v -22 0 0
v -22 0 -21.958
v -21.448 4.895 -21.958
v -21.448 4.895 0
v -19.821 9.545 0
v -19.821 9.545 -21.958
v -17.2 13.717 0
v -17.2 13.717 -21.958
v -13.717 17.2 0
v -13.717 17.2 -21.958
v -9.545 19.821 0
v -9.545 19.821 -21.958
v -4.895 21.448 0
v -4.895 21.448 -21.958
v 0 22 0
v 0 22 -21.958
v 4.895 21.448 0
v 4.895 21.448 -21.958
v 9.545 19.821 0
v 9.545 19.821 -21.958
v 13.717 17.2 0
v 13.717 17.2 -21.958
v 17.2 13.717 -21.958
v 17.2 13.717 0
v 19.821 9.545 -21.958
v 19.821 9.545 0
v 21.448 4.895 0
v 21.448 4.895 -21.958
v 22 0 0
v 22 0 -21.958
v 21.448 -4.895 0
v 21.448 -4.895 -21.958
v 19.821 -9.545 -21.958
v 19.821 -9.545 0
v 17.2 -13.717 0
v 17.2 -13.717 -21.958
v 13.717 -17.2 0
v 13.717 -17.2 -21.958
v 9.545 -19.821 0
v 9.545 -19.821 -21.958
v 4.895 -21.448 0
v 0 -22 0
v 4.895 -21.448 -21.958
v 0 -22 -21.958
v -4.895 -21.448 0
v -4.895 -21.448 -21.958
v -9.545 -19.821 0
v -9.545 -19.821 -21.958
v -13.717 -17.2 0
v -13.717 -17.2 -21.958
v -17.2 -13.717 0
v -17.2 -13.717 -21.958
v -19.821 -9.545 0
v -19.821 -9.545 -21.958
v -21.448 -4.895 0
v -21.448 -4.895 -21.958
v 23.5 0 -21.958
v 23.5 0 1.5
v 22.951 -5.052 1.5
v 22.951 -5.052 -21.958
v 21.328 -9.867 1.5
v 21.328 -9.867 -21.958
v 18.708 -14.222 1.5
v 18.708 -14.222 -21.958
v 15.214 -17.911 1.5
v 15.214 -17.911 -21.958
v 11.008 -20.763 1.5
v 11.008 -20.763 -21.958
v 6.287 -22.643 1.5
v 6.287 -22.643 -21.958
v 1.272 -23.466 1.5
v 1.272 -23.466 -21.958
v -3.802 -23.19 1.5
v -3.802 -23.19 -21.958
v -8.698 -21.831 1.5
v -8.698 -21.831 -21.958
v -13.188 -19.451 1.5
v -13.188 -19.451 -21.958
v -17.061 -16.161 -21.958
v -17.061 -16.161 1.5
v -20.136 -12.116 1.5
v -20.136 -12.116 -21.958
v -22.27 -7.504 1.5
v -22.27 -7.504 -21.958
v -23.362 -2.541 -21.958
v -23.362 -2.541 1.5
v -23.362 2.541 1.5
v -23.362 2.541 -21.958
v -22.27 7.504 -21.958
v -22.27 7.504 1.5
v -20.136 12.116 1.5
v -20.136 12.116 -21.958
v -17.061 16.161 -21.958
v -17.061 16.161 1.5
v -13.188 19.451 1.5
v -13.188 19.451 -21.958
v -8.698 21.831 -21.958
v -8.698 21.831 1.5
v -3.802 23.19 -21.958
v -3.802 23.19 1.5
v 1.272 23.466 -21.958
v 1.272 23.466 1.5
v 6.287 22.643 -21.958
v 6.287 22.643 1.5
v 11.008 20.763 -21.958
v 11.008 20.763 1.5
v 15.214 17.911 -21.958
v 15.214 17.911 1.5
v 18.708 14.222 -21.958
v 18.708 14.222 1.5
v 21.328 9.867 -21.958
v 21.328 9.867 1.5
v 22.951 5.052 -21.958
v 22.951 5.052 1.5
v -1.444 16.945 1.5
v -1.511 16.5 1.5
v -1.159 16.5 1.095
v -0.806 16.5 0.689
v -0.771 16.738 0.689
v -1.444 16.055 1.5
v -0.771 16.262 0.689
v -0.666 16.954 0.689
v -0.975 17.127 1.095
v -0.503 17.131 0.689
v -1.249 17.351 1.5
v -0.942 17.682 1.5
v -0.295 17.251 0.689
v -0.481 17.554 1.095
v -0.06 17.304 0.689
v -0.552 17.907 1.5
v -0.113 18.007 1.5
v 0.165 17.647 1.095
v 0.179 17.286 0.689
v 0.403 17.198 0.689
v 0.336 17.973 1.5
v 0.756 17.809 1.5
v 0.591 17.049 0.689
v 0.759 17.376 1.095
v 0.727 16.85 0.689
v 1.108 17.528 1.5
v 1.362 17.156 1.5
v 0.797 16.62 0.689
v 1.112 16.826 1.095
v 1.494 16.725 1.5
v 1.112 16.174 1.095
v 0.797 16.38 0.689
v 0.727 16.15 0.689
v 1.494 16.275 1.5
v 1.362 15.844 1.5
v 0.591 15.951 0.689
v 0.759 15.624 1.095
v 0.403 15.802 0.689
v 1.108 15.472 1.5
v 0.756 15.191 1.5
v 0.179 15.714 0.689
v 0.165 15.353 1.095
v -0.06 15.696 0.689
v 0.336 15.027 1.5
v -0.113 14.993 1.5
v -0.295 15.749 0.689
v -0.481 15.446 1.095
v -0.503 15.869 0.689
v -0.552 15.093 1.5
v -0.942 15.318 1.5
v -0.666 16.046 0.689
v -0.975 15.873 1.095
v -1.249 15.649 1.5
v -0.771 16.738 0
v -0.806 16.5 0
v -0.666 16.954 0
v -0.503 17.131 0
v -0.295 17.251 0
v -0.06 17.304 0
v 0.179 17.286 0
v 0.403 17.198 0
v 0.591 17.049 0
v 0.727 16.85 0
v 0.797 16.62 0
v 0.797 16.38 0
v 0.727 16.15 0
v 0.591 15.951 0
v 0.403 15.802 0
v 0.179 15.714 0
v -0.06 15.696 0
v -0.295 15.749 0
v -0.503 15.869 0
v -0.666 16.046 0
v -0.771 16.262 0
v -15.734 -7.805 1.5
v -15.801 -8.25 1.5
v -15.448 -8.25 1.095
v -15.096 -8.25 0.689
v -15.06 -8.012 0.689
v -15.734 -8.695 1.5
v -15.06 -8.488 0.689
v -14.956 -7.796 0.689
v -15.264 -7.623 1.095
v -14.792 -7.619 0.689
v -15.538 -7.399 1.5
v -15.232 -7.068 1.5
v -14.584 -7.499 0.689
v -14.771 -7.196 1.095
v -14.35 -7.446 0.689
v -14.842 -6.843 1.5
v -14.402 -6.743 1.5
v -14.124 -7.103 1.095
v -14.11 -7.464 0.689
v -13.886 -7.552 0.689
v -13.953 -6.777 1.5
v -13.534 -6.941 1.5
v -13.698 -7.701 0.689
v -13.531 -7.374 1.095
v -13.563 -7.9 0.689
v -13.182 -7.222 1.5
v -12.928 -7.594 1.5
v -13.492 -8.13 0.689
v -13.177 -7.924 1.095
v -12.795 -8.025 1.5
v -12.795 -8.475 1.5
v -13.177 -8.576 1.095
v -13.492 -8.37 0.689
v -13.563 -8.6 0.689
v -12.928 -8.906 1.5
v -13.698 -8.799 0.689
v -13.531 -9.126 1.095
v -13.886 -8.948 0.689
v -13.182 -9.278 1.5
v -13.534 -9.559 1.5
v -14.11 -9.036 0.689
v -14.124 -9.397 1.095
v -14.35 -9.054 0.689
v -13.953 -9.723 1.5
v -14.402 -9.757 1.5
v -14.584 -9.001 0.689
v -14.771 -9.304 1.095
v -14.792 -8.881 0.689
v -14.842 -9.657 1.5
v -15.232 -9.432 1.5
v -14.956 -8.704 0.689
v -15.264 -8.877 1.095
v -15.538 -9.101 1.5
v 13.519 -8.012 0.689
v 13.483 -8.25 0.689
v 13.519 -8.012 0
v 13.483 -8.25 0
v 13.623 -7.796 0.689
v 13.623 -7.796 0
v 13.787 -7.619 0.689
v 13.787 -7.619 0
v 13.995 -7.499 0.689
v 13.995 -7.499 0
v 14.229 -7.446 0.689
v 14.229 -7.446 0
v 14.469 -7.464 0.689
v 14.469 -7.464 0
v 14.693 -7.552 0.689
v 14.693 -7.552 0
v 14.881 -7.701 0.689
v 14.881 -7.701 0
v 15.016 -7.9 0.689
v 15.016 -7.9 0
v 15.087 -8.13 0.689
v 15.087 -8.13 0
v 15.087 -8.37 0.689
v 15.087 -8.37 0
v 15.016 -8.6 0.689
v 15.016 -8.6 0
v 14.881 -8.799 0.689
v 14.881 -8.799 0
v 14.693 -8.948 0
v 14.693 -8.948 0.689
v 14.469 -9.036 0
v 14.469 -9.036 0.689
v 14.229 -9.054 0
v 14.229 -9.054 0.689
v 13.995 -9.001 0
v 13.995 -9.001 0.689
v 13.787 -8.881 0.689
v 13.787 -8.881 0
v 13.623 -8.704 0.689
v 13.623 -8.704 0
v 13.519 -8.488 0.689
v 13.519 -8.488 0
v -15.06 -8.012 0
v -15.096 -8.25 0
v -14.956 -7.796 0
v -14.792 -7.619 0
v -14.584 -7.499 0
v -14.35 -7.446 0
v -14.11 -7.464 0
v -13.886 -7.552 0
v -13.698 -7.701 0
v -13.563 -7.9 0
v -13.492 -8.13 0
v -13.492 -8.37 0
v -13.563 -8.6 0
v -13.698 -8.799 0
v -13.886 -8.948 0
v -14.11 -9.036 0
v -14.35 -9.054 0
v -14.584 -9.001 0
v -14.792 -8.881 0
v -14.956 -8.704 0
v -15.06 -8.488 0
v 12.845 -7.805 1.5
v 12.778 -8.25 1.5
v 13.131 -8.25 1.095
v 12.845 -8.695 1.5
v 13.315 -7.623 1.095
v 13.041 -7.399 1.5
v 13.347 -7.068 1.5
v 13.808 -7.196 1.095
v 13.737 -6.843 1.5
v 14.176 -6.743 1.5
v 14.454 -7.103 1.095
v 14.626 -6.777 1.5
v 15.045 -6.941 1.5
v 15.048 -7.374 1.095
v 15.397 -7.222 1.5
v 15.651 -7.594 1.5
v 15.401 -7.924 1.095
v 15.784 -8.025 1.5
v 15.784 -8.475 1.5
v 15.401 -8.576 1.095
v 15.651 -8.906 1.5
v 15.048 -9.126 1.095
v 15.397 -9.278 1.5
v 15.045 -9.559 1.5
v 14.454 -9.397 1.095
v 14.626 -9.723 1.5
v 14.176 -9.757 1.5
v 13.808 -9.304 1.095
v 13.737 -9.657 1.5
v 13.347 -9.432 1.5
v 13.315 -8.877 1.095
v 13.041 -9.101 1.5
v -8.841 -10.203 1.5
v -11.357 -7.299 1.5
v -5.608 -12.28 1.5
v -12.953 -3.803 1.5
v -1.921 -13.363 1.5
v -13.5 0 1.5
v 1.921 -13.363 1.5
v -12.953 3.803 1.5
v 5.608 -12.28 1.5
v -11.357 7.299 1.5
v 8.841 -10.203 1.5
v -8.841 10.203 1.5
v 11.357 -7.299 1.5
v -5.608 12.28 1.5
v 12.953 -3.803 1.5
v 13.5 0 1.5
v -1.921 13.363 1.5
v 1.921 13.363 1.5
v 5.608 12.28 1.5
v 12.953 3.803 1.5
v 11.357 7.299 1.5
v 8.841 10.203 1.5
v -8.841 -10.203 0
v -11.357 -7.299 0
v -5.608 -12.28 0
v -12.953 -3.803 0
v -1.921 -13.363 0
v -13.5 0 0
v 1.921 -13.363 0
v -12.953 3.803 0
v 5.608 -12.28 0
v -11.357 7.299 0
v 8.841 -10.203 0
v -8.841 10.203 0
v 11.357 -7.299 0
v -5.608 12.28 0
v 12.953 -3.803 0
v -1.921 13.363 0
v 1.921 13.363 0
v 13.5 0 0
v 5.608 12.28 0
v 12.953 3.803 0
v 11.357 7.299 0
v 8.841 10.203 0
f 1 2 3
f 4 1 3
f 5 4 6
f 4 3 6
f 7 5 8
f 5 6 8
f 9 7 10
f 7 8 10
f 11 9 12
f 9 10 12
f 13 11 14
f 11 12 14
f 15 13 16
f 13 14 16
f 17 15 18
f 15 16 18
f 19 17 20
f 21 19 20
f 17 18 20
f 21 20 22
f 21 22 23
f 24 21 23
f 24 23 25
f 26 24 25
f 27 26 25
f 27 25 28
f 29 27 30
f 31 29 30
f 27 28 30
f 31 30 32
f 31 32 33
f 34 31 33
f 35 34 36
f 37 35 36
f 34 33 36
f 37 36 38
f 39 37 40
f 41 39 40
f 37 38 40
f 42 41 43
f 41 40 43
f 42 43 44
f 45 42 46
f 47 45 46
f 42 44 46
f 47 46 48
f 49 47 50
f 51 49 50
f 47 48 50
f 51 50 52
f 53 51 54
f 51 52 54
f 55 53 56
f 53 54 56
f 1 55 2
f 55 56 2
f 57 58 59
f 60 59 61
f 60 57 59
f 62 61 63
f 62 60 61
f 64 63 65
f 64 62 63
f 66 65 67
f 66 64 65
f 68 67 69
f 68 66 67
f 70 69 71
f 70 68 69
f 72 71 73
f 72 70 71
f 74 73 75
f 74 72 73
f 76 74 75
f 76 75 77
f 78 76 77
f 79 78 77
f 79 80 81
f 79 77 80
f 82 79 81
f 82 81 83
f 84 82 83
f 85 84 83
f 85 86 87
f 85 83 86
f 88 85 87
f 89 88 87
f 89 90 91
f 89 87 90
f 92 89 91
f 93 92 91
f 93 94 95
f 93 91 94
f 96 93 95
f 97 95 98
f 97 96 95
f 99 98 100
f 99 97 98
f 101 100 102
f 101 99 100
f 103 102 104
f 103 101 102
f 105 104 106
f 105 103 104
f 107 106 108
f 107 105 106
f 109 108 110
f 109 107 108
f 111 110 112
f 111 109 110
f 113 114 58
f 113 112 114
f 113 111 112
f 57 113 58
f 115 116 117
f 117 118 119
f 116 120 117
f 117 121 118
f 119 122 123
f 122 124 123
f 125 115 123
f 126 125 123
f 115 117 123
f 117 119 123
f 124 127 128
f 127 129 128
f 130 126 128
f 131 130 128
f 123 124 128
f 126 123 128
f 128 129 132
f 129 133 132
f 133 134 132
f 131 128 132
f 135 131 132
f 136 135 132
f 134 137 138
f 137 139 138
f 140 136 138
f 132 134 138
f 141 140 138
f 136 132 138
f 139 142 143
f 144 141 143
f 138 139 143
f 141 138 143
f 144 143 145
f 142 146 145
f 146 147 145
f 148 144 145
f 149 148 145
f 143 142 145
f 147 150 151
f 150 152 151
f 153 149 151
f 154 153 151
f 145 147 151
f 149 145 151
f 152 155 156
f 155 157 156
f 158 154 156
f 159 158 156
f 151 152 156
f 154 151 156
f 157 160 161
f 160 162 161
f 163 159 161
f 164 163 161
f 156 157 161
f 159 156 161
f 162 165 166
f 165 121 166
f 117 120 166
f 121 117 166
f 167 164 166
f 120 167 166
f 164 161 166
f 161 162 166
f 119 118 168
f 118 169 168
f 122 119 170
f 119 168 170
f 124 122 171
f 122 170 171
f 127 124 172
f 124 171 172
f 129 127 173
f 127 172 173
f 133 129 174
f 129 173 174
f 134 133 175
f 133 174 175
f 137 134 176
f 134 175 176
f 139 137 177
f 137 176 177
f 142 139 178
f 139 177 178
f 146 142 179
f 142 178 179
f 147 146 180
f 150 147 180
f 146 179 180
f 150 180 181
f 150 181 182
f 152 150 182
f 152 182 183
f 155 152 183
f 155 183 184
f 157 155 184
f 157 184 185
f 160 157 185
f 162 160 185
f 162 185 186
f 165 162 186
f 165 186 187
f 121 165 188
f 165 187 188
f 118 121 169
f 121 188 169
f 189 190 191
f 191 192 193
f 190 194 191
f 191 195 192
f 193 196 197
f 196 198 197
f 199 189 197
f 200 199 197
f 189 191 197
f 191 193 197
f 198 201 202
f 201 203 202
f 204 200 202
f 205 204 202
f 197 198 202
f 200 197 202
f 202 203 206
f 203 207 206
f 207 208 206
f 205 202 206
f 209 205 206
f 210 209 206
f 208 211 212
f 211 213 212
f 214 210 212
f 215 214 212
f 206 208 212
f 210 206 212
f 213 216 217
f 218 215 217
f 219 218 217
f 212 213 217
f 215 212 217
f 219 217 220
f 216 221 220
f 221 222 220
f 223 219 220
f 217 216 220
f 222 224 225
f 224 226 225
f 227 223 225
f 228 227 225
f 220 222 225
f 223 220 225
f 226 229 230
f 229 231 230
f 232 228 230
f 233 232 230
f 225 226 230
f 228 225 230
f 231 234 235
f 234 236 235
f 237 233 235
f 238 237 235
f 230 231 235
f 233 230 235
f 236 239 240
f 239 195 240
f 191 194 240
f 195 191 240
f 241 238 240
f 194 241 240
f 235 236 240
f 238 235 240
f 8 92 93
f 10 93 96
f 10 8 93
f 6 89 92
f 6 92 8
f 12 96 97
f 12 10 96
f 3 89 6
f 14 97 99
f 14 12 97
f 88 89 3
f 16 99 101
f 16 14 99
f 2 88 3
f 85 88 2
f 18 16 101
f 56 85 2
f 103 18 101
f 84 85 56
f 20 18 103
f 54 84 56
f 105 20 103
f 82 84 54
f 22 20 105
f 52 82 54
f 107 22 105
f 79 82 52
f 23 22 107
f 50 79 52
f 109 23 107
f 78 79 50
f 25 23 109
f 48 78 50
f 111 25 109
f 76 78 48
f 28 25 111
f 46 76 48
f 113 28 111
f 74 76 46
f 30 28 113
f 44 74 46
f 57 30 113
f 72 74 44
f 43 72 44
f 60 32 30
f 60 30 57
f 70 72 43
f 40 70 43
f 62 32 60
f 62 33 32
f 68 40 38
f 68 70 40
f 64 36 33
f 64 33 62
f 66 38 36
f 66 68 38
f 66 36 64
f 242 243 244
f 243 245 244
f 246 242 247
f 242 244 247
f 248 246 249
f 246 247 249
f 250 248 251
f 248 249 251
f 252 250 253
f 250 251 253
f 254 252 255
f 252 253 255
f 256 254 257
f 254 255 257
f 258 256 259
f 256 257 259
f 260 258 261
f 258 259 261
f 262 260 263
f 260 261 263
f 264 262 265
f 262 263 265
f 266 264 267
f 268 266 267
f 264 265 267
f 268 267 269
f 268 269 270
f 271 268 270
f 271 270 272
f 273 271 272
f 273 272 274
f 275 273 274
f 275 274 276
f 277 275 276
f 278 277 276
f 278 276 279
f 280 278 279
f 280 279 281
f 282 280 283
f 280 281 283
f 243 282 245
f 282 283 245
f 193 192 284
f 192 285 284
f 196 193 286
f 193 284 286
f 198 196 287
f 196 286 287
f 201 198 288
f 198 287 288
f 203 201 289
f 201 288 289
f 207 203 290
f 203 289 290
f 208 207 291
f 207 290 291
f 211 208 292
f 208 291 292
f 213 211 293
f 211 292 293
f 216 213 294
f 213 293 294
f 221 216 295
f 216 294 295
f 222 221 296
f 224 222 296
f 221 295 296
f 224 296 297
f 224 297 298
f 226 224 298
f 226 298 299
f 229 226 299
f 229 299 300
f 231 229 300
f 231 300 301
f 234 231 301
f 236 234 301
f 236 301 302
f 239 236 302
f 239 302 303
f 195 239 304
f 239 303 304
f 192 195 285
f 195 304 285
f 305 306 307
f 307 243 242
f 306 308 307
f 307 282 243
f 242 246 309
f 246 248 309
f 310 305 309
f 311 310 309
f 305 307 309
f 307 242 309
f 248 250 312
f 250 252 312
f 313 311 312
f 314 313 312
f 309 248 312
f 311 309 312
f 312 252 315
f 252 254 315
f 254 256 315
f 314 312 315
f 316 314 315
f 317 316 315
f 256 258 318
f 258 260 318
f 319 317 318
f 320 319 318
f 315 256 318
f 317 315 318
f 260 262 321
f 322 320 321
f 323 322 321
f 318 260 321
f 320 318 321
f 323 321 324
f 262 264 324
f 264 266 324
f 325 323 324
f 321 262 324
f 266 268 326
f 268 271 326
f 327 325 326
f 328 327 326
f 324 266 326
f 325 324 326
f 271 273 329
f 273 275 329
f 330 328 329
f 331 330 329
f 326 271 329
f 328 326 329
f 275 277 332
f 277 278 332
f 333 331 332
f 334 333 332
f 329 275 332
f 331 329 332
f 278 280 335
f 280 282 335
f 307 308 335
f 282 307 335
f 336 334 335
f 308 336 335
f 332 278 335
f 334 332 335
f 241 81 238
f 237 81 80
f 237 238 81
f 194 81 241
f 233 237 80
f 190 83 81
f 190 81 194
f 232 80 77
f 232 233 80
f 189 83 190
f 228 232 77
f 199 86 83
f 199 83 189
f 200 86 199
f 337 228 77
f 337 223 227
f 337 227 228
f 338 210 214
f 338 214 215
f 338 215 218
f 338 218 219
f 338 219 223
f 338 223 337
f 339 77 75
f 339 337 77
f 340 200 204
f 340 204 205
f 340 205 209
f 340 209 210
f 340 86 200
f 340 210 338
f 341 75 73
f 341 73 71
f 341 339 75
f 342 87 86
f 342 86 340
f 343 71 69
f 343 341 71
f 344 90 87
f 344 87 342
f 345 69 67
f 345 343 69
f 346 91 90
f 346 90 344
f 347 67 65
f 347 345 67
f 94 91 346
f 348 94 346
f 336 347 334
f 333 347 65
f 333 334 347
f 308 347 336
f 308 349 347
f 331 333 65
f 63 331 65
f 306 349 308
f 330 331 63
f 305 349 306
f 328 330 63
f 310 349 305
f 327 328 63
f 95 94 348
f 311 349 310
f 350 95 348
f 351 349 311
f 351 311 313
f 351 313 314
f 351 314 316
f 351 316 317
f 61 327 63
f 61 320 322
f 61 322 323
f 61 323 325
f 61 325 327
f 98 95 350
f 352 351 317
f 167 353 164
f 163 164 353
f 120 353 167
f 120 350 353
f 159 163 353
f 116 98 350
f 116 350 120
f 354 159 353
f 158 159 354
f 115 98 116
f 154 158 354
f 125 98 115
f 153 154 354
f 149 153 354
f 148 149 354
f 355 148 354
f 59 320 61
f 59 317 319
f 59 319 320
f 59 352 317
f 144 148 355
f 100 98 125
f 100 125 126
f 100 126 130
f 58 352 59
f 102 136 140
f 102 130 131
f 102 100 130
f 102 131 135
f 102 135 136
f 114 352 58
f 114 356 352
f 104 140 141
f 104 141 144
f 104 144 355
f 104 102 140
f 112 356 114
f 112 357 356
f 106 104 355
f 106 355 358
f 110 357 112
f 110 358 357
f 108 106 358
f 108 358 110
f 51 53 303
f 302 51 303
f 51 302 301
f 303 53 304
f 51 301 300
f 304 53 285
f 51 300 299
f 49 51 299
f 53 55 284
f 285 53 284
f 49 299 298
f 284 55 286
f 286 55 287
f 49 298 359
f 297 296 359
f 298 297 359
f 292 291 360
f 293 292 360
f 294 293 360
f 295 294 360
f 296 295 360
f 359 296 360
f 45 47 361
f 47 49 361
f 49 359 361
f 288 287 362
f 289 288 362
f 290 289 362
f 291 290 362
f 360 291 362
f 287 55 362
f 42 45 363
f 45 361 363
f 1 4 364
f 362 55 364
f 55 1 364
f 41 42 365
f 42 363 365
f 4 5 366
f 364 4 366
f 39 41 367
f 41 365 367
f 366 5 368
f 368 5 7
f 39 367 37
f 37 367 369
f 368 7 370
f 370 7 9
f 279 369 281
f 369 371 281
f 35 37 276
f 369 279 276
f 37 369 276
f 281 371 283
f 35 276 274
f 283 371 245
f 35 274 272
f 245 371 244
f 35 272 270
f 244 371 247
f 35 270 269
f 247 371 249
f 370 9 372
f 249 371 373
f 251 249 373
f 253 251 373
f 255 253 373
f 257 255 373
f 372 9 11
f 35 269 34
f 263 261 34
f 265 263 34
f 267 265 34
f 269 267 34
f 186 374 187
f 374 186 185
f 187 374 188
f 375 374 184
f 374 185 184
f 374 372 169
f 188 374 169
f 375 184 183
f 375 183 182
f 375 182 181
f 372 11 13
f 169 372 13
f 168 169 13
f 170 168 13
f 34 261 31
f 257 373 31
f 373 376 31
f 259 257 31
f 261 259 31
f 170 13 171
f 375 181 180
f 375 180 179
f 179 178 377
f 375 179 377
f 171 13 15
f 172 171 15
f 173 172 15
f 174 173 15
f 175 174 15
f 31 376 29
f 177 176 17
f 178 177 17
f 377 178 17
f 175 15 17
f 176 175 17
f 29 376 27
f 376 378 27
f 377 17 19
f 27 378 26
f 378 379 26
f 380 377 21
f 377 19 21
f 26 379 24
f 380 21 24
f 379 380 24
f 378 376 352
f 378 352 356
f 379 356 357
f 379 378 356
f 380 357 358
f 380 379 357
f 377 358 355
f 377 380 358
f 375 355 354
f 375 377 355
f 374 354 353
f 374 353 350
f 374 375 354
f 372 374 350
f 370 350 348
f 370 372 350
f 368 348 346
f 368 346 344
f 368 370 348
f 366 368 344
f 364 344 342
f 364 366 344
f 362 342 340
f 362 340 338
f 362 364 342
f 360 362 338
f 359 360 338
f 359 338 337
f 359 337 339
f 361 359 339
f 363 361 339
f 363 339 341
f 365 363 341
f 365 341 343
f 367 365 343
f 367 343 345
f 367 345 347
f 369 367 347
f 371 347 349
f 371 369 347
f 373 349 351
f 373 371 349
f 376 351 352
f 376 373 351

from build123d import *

# Parameters (mm, degrees)
SKETCH1_R                                      = 20.5
SKETCH1_R_2                                    = 1.5875
SKETCH1_R_3                                    = 13.5
EXTRUDE1_DEPTH                                 = 1.5
BOSS_EXTRUDE3_START                            = -1.5
SKETCH4_R                                      = 23.5
SKETCH4_R_2                                    = 20.5
BOSS_EXTRUDE3_DEPTH                            = 1.5
BOSS_EXTRUDE5_START                            = 21.9577
SKETCH5_R                                      = 23.5
SKETCH5_R_2                                    = 22
BOSS_EXTRUDE5_DEPTH                            = 21.9577
CSK_FOR_0_FLAT_HEAD_MACHINE_SCREW1_D           = 1.6129
CSK_FOR_0_FLAT_HEAD_MACHINE_SCREW1_CSINK_D     = 3.0226
CSK_FOR_0_FLAT_HEAD_MACHINE_SCREW1_CSINK_ANGLE = 82


with BuildPart() as part:
    # Sketch1 → Extrude1 (new body)
    # profile 1 of 4: a face of its own
    with BuildSketch(Plane.XY):
        Circle(SKETCH1_R)
        with Locations((-14.289419162, -8.25)):
            Circle(SKETCH1_R_2, mode=Mode.SUBTRACT)
        with Locations((14.289419162, -8.25)):
            Circle(SKETCH1_R_2, mode=Mode.SUBTRACT)
        with Locations((0, 16.5)):
            Circle(SKETCH1_R_2, mode=Mode.SUBTRACT)
        Circle(SKETCH1_R_3, mode=Mode.SUBTRACT)
    # profile 2 of 4: a face of its own
    with BuildSketch(Plane.XY):
        with Locations((14.289419162, -8.25)):
            Circle(SKETCH1_R_2)
    # profile 3 of 4: a face of its own
    with BuildSketch(Plane.XY):
        with Locations((0, 16.5)):
            Circle(SKETCH1_R_2)
    # profile 4 of 4: a face of its own
    with BuildSketch(Plane.XY):
        with Locations((-14.289419162, -8.25)):
            Circle(SKETCH1_R_2)
    extrude(amount=EXTRUDE1_DEPTH)

    # Sketch4 → Boss-Extrude3 (add)
    with BuildSketch(Plane.XY.offset(1.5).offset(BOSS_EXTRUDE3_START)):
        Circle(SKETCH4_R)
        Circle(SKETCH4_R_2, mode=Mode.SUBTRACT)
    extrude(amount=BOSS_EXTRUDE3_DEPTH)

    # Sketch5 → Boss-Extrude5 (add)
    with BuildSketch(Plane(origin=(0, 0, 0), x_dir=(-1, 0, 0), z_dir=(0, 0, -1)).offset(BOSS_EXTRUDE5_START)):
        with Locations(Location((0, 0, 0), (0, 0, 180))):
            Circle(SKETCH5_R)
        Circle(SKETCH5_R_2, mode=Mode.SUBTRACT)
    extrude(amount=-BOSS_EXTRUDE5_DEPTH)

    # CSK for #0 Flat Head Machine Screw1 (through all)
    with Locations(Plane(origin=(0, 16.5, 1.5), x_dir=(1, 0, 0), z_dir=(0, 0, 1))):
        with Locations((0, 0), (14.289419162, -24.75), (-14.289419162, -24.75)):
            CounterSinkHole(CSK_FOR_0_FLAT_HEAD_MACHINE_SCREW1_D / 2, CSK_FOR_0_FLAT_HEAD_MACHINE_SCREW1_CSINK_D / 2, counter_sink_angle=CSK_FOR_0_FLAT_HEAD_MACHINE_SCREW1_CSINK_ANGLE)


solid = part.part
